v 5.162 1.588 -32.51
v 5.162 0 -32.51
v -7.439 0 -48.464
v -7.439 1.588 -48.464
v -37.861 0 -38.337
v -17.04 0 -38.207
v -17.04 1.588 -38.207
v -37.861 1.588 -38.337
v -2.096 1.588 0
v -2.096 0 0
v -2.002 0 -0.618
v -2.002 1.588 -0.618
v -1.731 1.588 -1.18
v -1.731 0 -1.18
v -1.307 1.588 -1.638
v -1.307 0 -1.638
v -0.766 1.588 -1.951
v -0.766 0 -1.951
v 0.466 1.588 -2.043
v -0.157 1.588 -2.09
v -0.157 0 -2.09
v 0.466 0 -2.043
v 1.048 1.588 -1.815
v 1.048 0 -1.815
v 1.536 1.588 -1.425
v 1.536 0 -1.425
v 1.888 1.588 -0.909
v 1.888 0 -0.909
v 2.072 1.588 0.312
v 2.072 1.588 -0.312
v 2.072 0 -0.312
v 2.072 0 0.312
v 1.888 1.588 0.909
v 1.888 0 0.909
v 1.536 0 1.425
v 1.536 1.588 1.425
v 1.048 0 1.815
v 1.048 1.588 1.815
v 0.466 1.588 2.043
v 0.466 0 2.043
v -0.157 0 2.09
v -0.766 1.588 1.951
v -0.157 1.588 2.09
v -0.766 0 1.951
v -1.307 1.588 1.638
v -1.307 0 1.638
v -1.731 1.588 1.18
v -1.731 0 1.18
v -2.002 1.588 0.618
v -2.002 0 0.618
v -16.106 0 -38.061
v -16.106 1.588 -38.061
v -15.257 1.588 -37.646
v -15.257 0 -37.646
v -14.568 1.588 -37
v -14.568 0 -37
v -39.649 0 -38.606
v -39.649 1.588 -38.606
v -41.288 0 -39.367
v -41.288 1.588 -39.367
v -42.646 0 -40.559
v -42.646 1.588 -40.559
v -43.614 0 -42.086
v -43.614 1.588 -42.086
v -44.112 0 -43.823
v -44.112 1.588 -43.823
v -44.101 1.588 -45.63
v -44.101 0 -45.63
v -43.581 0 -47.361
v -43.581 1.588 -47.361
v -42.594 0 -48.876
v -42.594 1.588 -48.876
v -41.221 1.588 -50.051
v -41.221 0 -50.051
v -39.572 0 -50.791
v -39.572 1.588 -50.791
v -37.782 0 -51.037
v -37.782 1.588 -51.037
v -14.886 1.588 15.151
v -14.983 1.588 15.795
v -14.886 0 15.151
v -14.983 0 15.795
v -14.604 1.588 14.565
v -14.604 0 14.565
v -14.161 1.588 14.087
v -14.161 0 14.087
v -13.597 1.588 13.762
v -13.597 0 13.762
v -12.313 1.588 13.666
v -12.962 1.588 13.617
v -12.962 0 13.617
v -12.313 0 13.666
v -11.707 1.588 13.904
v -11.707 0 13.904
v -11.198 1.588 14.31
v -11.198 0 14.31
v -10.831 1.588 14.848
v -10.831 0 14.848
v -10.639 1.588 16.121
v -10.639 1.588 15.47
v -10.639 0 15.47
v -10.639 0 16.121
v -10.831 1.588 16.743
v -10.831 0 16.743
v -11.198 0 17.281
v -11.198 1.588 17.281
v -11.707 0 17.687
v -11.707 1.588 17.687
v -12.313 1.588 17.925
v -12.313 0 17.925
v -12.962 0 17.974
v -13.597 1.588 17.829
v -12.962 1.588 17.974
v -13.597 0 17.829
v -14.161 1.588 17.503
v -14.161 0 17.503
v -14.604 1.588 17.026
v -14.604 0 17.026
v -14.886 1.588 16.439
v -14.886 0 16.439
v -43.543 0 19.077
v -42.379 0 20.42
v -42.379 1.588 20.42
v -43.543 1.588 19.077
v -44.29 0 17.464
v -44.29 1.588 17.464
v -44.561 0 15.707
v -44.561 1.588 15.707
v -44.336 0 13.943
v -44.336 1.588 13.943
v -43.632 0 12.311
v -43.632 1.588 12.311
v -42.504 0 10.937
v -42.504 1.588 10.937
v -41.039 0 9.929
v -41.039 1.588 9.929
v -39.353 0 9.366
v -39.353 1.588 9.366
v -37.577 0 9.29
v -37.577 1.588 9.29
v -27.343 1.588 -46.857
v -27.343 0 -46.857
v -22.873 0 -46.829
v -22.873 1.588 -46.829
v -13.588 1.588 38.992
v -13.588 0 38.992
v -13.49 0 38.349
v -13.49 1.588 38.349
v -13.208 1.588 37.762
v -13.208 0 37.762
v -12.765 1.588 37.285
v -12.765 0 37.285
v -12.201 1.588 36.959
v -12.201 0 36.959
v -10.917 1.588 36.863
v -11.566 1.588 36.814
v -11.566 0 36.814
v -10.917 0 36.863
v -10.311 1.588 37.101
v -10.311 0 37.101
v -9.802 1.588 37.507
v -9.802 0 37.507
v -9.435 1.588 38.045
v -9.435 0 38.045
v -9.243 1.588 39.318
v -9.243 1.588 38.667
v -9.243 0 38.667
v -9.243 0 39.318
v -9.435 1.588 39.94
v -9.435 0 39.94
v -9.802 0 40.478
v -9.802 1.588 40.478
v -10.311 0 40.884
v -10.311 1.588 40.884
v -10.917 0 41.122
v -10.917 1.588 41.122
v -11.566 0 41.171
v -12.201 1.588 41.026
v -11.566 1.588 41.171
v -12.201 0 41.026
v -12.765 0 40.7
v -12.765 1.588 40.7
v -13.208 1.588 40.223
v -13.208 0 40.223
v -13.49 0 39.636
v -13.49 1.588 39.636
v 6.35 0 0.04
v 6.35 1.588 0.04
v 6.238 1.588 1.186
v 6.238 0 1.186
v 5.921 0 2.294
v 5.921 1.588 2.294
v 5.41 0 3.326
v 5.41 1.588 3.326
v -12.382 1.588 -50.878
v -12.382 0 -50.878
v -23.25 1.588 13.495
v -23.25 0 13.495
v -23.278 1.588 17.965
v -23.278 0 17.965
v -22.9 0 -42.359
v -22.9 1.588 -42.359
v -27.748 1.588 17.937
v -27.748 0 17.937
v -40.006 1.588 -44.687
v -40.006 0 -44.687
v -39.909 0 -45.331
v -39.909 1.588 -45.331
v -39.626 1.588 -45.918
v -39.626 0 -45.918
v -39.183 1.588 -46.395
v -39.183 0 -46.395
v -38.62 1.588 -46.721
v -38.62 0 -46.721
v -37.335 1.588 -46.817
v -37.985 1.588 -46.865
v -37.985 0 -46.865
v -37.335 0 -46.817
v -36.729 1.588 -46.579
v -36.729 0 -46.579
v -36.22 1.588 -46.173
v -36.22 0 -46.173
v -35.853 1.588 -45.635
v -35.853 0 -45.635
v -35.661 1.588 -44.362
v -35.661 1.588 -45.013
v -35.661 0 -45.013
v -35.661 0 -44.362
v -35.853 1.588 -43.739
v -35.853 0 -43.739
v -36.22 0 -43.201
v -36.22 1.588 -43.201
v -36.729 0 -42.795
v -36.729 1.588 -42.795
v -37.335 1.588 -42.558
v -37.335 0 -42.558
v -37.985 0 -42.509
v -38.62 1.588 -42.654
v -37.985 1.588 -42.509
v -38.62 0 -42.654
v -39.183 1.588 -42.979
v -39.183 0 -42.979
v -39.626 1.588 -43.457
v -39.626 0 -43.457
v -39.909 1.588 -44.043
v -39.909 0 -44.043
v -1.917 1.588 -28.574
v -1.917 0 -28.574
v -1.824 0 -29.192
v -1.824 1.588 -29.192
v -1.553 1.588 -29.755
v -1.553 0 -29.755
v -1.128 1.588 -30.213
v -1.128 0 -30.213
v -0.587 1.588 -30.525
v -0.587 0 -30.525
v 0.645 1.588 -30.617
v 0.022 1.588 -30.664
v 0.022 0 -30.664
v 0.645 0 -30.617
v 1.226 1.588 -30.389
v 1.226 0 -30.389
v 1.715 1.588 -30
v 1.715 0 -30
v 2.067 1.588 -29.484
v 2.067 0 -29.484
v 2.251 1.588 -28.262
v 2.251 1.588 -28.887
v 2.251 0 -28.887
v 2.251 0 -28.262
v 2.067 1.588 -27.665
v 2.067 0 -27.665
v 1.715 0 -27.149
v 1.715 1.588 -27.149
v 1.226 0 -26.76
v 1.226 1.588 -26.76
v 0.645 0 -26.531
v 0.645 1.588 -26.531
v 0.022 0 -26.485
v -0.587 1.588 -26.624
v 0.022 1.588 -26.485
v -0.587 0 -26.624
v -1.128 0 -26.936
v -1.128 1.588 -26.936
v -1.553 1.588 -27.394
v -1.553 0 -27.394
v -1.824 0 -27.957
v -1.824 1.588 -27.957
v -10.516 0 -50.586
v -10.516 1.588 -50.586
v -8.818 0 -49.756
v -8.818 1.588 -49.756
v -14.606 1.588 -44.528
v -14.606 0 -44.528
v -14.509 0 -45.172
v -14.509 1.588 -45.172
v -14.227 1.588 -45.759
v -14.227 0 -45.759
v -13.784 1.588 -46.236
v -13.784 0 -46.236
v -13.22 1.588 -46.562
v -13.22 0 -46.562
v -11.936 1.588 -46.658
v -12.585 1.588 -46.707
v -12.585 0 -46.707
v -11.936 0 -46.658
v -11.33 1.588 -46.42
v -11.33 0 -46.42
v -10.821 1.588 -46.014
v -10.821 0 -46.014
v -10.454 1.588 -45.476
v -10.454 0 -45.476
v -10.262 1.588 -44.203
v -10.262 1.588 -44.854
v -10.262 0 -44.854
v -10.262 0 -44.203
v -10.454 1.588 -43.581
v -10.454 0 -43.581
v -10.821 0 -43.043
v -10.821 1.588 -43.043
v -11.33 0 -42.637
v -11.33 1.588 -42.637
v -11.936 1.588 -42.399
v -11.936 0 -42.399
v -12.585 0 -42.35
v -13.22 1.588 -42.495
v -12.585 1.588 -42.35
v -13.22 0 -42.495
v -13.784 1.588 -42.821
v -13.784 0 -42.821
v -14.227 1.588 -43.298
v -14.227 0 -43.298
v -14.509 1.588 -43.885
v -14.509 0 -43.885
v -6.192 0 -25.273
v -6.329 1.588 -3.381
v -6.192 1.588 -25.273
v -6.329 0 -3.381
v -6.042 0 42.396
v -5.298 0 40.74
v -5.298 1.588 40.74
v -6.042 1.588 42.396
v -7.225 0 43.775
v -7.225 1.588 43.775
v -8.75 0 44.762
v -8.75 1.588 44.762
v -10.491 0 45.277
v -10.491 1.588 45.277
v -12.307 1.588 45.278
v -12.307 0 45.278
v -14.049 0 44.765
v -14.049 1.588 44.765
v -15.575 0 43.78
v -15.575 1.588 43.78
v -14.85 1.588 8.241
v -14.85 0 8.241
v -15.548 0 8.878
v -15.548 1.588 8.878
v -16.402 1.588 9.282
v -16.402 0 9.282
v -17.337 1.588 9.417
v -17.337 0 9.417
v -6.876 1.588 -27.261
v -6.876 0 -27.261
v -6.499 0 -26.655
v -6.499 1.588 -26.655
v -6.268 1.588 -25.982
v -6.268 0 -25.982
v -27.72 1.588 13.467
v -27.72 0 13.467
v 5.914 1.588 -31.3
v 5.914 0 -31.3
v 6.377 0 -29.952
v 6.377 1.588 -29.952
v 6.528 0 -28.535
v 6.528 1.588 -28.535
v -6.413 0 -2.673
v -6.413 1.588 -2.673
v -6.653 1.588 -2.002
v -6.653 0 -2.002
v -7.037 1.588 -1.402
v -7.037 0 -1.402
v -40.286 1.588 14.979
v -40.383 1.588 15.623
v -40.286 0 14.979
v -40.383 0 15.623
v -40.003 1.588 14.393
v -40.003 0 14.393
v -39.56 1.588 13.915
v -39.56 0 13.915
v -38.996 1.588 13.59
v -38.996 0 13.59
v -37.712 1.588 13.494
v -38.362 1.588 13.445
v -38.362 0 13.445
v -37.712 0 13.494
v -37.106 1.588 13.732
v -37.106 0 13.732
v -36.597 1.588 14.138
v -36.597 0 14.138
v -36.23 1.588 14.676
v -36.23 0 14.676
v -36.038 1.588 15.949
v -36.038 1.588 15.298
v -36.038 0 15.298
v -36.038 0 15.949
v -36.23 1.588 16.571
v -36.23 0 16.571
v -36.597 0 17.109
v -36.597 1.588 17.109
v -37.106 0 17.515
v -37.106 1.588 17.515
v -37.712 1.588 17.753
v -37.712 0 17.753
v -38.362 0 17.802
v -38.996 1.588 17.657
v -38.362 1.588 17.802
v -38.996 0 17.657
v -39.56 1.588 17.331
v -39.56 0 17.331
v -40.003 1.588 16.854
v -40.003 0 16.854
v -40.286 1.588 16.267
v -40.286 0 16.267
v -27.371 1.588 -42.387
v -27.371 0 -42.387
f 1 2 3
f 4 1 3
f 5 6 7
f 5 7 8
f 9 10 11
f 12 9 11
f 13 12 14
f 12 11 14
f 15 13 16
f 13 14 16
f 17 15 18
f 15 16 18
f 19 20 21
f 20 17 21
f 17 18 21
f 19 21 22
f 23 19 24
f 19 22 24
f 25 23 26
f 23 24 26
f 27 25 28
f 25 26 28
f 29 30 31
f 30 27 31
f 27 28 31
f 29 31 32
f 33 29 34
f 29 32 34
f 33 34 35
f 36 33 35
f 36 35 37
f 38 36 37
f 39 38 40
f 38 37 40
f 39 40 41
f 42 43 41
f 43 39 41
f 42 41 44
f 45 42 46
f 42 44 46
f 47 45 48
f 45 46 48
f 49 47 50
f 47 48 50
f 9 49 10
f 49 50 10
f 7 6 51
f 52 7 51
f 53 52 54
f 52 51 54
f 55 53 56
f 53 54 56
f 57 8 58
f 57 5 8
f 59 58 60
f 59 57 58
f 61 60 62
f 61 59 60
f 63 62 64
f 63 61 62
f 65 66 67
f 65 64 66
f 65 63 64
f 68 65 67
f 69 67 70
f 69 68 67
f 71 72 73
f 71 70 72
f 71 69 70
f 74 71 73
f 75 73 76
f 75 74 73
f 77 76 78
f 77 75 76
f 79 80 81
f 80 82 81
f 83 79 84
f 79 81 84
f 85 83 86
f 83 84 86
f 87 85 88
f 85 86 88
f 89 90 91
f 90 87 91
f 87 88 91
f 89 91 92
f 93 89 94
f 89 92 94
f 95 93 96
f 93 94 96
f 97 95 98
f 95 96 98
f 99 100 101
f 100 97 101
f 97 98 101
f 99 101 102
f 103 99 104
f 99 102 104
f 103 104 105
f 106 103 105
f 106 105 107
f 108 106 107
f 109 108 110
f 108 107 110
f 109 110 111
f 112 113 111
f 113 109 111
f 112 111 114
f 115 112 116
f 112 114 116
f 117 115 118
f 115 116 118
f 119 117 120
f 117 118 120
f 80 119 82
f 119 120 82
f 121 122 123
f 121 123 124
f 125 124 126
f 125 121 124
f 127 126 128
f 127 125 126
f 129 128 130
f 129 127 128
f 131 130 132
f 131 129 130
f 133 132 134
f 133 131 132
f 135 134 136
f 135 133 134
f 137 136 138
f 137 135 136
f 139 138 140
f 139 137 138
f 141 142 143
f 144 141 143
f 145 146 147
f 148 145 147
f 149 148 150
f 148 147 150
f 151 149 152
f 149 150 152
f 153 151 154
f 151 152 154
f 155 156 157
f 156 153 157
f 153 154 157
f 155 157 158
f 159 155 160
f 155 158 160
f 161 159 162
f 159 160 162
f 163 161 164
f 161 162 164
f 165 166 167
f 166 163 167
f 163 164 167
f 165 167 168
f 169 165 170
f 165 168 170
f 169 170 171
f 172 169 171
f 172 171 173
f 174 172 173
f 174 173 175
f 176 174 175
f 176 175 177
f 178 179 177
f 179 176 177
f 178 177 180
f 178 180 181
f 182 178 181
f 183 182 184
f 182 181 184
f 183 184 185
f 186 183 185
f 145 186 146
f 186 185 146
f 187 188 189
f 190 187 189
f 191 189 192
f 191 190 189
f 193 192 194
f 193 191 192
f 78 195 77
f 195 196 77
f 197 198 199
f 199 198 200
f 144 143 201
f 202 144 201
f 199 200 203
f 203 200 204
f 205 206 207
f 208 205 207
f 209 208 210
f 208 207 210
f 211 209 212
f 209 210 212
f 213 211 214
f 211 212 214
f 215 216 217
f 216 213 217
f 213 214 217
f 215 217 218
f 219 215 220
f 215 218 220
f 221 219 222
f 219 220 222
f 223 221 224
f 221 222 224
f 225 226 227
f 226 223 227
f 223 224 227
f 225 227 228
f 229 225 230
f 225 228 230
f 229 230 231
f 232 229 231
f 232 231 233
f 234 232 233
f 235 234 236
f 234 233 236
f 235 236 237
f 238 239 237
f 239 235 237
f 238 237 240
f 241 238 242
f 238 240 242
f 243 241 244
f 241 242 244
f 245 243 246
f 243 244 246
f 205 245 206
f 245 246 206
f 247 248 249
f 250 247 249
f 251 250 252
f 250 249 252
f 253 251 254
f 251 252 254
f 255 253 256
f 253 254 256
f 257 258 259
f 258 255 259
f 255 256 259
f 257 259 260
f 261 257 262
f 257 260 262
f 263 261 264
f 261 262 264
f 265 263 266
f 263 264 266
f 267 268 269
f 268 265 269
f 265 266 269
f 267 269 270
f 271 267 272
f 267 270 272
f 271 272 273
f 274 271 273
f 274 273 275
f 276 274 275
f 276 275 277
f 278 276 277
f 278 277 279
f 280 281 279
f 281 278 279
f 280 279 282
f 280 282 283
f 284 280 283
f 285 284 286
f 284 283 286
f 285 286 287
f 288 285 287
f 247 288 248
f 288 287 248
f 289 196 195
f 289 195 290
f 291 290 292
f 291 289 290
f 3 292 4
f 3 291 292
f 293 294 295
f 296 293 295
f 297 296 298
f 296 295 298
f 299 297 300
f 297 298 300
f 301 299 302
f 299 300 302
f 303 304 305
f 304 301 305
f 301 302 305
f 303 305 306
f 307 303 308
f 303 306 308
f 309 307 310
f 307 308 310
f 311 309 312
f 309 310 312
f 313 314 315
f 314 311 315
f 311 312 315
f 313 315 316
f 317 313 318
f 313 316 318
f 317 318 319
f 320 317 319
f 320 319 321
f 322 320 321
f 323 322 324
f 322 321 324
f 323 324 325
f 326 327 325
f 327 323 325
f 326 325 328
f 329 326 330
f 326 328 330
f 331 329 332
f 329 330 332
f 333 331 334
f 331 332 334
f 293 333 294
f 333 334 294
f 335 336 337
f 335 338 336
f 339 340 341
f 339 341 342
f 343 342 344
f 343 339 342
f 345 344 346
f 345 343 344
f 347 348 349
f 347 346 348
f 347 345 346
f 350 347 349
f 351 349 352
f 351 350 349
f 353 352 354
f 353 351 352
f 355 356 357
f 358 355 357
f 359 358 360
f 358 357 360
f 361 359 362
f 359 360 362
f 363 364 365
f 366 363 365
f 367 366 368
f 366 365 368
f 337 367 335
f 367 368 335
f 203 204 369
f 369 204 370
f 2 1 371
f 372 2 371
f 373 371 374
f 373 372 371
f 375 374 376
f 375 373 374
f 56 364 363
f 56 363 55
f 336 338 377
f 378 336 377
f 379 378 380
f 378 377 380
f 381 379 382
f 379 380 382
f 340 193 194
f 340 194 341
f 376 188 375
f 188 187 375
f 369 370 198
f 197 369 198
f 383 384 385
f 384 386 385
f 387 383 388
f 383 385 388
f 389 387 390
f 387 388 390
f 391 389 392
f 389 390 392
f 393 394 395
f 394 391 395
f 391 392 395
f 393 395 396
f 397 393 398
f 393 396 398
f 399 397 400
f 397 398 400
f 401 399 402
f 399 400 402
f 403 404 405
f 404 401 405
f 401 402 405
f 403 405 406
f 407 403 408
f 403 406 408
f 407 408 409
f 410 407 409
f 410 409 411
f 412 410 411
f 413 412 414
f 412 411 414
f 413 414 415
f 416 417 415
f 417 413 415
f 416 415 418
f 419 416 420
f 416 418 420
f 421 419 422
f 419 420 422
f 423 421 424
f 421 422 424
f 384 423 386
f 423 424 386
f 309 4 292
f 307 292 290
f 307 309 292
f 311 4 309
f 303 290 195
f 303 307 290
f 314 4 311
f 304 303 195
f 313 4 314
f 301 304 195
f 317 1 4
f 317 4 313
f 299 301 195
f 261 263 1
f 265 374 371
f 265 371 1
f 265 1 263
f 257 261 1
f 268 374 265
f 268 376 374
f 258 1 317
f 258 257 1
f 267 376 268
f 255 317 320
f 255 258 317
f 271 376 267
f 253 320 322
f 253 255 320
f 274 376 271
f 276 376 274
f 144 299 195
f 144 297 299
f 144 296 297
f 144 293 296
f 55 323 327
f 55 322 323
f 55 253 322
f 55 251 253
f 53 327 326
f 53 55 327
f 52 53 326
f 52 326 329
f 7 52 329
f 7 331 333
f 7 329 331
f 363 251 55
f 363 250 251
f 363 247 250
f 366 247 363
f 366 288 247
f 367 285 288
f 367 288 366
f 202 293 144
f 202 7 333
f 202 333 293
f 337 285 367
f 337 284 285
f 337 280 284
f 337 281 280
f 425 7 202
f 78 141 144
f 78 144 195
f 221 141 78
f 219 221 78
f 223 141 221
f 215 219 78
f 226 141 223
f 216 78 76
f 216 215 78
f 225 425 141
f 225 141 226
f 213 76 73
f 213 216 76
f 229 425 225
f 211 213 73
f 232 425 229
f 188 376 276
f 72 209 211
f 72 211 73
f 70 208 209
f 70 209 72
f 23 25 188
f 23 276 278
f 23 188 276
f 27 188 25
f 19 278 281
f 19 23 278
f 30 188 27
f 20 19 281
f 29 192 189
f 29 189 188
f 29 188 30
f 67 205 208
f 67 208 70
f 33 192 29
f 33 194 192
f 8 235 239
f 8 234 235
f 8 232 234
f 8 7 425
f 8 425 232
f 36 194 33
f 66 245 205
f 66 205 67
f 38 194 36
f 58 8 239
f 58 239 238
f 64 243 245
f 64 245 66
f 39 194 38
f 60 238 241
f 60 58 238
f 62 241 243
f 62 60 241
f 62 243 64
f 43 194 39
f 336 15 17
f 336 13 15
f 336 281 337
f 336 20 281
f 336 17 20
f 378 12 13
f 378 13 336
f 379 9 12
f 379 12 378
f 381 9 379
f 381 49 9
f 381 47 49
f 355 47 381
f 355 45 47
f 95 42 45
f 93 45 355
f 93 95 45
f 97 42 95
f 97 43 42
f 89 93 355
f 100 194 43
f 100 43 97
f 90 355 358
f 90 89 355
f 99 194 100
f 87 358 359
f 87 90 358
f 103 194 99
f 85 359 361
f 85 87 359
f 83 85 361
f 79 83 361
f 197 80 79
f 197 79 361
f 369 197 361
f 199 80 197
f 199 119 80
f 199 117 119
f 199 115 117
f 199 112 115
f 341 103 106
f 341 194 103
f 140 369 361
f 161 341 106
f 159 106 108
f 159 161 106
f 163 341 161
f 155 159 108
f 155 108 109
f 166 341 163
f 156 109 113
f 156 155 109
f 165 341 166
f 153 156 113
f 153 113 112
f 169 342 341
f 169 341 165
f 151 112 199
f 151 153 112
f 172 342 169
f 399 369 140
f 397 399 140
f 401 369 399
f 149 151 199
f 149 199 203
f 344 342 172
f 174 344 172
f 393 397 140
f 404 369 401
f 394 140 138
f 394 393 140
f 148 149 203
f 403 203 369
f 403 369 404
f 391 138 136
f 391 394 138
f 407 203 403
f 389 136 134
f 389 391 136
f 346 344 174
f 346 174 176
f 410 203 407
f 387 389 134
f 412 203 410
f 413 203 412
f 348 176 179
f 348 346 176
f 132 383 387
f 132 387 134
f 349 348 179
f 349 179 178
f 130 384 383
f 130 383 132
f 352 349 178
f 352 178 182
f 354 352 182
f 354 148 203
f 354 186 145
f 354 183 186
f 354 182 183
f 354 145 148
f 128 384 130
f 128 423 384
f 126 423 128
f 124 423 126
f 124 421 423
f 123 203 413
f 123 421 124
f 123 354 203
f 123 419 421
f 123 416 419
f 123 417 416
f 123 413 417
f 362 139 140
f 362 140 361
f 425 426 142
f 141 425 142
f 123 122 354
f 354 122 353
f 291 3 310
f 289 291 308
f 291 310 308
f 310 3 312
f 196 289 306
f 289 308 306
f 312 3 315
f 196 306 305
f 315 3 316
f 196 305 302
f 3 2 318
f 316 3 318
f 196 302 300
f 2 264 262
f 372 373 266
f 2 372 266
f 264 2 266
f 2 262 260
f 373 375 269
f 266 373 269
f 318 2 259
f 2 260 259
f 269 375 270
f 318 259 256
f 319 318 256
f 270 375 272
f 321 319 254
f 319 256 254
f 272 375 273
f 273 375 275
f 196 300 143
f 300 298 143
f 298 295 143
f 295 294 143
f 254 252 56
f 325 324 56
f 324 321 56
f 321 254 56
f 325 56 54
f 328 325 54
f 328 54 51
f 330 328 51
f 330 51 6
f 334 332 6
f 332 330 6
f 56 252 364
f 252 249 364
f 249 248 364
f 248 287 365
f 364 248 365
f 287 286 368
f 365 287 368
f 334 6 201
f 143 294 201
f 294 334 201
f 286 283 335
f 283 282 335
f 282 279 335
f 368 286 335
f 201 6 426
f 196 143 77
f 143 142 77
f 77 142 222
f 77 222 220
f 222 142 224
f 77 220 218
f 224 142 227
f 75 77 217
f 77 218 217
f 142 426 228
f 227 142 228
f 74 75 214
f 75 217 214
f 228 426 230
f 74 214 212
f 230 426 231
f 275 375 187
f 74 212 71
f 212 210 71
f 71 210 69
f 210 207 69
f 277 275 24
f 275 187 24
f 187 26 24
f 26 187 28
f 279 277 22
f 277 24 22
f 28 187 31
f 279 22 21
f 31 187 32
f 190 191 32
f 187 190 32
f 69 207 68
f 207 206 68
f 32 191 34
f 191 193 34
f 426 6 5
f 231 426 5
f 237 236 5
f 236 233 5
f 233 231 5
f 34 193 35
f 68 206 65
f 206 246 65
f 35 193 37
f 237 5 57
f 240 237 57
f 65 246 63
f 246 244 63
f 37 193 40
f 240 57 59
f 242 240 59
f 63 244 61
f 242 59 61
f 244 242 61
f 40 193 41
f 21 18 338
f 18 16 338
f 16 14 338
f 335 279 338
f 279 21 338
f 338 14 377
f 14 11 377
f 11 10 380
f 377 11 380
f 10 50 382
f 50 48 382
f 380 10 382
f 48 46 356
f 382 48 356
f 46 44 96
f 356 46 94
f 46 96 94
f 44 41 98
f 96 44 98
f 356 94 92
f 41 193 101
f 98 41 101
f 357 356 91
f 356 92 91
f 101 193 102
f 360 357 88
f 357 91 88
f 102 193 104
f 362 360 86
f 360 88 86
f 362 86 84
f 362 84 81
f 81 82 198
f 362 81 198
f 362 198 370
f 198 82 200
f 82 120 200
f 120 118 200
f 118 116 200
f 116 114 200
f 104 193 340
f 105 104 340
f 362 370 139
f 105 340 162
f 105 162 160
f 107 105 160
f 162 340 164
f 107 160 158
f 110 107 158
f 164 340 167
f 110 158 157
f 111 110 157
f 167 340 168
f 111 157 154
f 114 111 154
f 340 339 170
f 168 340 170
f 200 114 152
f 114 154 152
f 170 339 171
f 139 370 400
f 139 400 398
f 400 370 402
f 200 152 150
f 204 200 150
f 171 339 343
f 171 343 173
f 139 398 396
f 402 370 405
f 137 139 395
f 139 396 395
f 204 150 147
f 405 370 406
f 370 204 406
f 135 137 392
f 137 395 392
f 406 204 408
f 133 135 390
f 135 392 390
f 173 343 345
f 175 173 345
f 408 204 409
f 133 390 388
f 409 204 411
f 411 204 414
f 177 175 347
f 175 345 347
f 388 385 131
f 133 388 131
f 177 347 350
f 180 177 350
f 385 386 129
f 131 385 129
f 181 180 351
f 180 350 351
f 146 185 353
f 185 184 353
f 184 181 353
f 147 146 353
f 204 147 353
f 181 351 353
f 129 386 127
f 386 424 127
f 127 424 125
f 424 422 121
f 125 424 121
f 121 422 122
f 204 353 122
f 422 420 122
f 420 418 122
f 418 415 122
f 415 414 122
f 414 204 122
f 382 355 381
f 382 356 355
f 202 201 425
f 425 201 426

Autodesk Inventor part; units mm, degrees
ref_plane "YZ Plane" through (0, 0, 0) normal (1, 0, 0) x (0, 1, 0)
ref_plane "XZ Plane" through (0, 0, 0) normal (0, 1, 0) x (-1, 0, 0)
ref_plane "XY Plane" through (0, 0, 0) normal (0, 0, 1) x (1, 0, 0)
sketch "main_gusset" plane through (0, 0, 0) normal (0, 0, 1) x (1, 0, 0)
  circle A0 centre (-10.4381, -28.24) radius 2.1844
  arc A1 (-15.3966, -32.2068) -> (-10.4381, -34.59) centre (-10.4381, -28.24) ccw
  circle A2 centre (-23.1381, -12.365) radius 2.0955
  line L0 (-16.7881, 12.8688) -> (-16.7881, -9.0238)
  line L1 (-29.4881, 16.21) -> (-29.4881, -12.365)
  arc A3 (-16.7881, -9.0238) -> (-16.0924, -11.0072) centre (-13.6131, -9.0238) ccw
  arc A4 (-29.4881, -12.365) -> (-28.0966, -16.3318) centre (-23.1381, -12.365) ccw
  line L2 (-16.0924, -11.0072) -> (-8.3394, -20.6984)
  arc A5 (-8.3394, -20.6984) -> (-5.8602, -21.89) centre (-5.8602, -18.715) ccw
  line L3 (-28.0966, -16.3318) -> (-15.3966, -32.2068)
  line L4 (-10.4381, -34.59) -> (14.9619, -34.59)
  circle A6 centre (-10.4381, 32.085) radius 2.1844
  circle A7 centre (14.9619, 32.0717) radius 2.1844
  arc A8 (-10.4381, 38.435) -> (-15.3966, 36.0518) centre (-10.4381, 32.085) ccw
  arc A9 (14.3804, 25.735) -> (14.9619, 38.435) centre (14.9619, 32.0717) ccw
  line L5 (14.9619, 38.435) -> (-10.4381, 38.435)
  circle A10 centre (-23.1381, 16.21) radius 2.0955
  line L6 (14.9619, 25.735) -> (-5.8602, 25.735)
  arc A11 (-16.0924, 14.8522) -> (-16.7881, 12.8688) centre (-13.6131, 12.8688) ccw
  arc A12 (-28.0966, 20.1768) -> (-29.4881, 16.21) centre (-23.1381, 16.21) ccw
  line L7 (-8.3394, 24.5434) -> (-16.0924, 14.8522)
  arc A13 (-5.8602, 25.735) -> (-8.3394, 24.5434) centre (-5.8602, 22.56) ccw
  line L8 (-28.0966, 20.1768) -> (-15.3966, 36.0518)
  circle A14 centre (14.9619, -28.24) radius 2.1844
  arc A15 (14.9619, -34.59) -> (14.9619, -21.89) centre (14.9619, -28.24) ccw
  line L9 (-5.8602, -21.89) -> (14.9619, -21.89)
  line L10 (0.0267, 34.3202) -> (4.4971, 34.3202)
  line L11 (4.4971, 34.3202) -> (4.4971, 29.8498)
  line L12 (4.4971, 29.8498) -> (0.0267, 29.8498)
  line L13 (0.0267, 29.8498) -> (0.0267, 34.3202)
  line L14 (0.0267, 34.3202) -> (4.4971, 29.8498) construction
  line L15 (4.4971, 34.3202) -> (0.0267, 29.8498) construction
  line L16 (0.0267, -26.0048) -> (4.4971, -26.0048)
  line L17 (4.4971, -26.0048) -> (4.4971, -30.4752)
  line L18 (4.4971, -30.4752) -> (0.0267, -30.4752)
  line L19 (0.0267, -30.4752) -> (0.0267, -26.0048)
  line L20 (0.0267, -26.0048) -> (4.4971, -30.4752) construction
  line L21 (4.4971, -26.0048) -> (0.0267, -30.4752) construction
  point P0 (-1.5323, 2.5213)
  point P1 (2.2619, 32.085)
  point P2 (2.2619, -28.24)
  dimension "d0" = 12.7
  dimension "d1" = 12.7
  dimension "d2" = 12.7
  dimension "d3" = 3.175
  dimension "d6" = 4.4704
  dimension "d7" = 4.4704
  dimension "d8" = 4.4704
  dimension "d9" = 4.4704
  dimension "d10" = 12.7
  dimension "d11" = 12.7
  dimension "d12" = 6.35
  dimension "d13" = 6.35
  dimension "d14" = 15.875
  dimension "d15" = 15.875
  dimension "d16" = 12.7
sketch "Sketch1" plane through (0, 0, 0) normal (0, 1, 0) x (-1, 0, 0)
  arc A0 (15.5751, 43.7797) -> (5.2982, 40.7397) centre (11.4031, 38.9925) ccw
  line L0 (42.3791, 20.4205) -> (15.5751, 43.7797)
  line L1 (-6.3499, 0.0397) -> (5.2982, 40.7397)
  circle A1 centre (11.4031, 38.9925) radius 2.1844 projected
  arc A2 (15.5751, 43.7797) -> (5.2982, 40.7397) centre (11.4031, 38.9925) ccw
  circle A3 centre (12.422, -44.5285) radius 2.1844
  arc A4 (7.4388, -48.4642) -> (12.3823, -50.8784) centre (12.422, -44.5285) ccw
  circle A5 centre (-0.1786, -28.5744) radius 2.0955
  line L2 (6.329, -3.3808) -> (6.1922, -25.273)
  line L3 (-6.3499, 0.0397) -> (-6.5284, -28.5348)
  arc A6 (6.1922, -25.273) -> (6.8755, -27.2607) centre (9.3671, -25.2928) ccw
  arc A7 (-6.5284, -28.5348) -> (-5.1618, -32.5102) centre (-0.1786, -28.5744) ccw
  line L4 (6.8755, -27.2607) -> (14.5678, -37.0002)
  arc A8 (14.5678, -37.0002) -> (17.0395, -38.2072) centre (17.0594, -35.0323) ccw
  line L5 (-5.1618, -32.5102) -> (7.4388, -48.4642)
  line L6 (12.3823, -50.8784) -> (37.7818, -51.0371)
  circle A9 centre (12.799, 15.7953) radius 2.1844
  circle A10 centre (38.1984, 15.6233) radius 2.1844
  arc A11 (12.8386, 22.1452) -> (7.8653, 19.793) centre (12.799, 15.7953) ccw
  arc A12 (37.5773, 9.2904) -> (38.2381, 21.9865) centre (38.1984, 15.6233) ccw
  line L7 (38.2381, 21.9865) -> (12.8386, 22.1452)
  circle A13 centre (0, 0) radius 2.0955
  line L8 (38.1588, 9.2867) -> (17.3371, 9.4168)
  arc A14 (7.0371, -1.4018) -> (6.329, -3.3808) centre (9.5039, -3.4006) ccw
  arc A15 (-4.9336, 3.9977) -> (-6.3499, 0.0397) centre (0, 0) ccw
  line L9 (14.8505, 8.2408) -> (7.0371, -1.4018)
  arc A16 (17.3371, 9.4168) -> (14.8505, 8.2408) centre (17.3173, 6.2419) ccw
  line L10 (-4.9336, 3.9977) -> (7.8653, 19.793)
  circle A17 centre (37.8215, -44.6872) radius 2.1844
  arc A18 (37.7818, -51.0371) -> (37.8612, -38.3374) centre (37.8215, -44.6872) ccw
  line L11 (17.0395, -38.2072) -> (37.8612, -38.3374)
  line L12 (23.2775, 17.9651) -> (27.7478, 17.9371)
  line L13 (27.7478, 17.9371) -> (27.7199, 13.4668)
  line L14 (27.7199, 13.4668) -> (23.2496, 13.4948)
  line L15 (23.2496, 13.4948) -> (23.2775, 17.9651)
  line L16 (23.2775, 17.9651) -> (27.7199, 13.4668) construction
  line L17 (27.7478, 17.9371) -> (23.2496, 13.4948) construction
  line L18 (22.9005, -42.3587) -> (27.3708, -42.3867)
  line L19 (27.3708, -42.3867) -> (27.3429, -46.857)
  line L20 (27.3429, -46.857) -> (22.8726, -46.8291)
  line L21 (22.8726, -46.8291) -> (22.9005, -42.3587)
  line L22 (22.9005, -42.3587) -> (27.3429, -46.857) construction
  line L23 (27.3708, -42.3867) -> (22.8726, -46.8291) construction
  point P0 (0, 0)
  point P1 (42.3791, 20.4205)
  point P2 (-6.3499, 0.0397)
  point P3 (-5.4094, 3.3258)
  point P4 (-6.3499, 0.0397)
  dimension "d18" = 12.7
extrude "Extrusion1" add sketch "Sketch1" along normal blind 1.5875
properties part number "funnel_gusset" material "Acetal Resin, White"
